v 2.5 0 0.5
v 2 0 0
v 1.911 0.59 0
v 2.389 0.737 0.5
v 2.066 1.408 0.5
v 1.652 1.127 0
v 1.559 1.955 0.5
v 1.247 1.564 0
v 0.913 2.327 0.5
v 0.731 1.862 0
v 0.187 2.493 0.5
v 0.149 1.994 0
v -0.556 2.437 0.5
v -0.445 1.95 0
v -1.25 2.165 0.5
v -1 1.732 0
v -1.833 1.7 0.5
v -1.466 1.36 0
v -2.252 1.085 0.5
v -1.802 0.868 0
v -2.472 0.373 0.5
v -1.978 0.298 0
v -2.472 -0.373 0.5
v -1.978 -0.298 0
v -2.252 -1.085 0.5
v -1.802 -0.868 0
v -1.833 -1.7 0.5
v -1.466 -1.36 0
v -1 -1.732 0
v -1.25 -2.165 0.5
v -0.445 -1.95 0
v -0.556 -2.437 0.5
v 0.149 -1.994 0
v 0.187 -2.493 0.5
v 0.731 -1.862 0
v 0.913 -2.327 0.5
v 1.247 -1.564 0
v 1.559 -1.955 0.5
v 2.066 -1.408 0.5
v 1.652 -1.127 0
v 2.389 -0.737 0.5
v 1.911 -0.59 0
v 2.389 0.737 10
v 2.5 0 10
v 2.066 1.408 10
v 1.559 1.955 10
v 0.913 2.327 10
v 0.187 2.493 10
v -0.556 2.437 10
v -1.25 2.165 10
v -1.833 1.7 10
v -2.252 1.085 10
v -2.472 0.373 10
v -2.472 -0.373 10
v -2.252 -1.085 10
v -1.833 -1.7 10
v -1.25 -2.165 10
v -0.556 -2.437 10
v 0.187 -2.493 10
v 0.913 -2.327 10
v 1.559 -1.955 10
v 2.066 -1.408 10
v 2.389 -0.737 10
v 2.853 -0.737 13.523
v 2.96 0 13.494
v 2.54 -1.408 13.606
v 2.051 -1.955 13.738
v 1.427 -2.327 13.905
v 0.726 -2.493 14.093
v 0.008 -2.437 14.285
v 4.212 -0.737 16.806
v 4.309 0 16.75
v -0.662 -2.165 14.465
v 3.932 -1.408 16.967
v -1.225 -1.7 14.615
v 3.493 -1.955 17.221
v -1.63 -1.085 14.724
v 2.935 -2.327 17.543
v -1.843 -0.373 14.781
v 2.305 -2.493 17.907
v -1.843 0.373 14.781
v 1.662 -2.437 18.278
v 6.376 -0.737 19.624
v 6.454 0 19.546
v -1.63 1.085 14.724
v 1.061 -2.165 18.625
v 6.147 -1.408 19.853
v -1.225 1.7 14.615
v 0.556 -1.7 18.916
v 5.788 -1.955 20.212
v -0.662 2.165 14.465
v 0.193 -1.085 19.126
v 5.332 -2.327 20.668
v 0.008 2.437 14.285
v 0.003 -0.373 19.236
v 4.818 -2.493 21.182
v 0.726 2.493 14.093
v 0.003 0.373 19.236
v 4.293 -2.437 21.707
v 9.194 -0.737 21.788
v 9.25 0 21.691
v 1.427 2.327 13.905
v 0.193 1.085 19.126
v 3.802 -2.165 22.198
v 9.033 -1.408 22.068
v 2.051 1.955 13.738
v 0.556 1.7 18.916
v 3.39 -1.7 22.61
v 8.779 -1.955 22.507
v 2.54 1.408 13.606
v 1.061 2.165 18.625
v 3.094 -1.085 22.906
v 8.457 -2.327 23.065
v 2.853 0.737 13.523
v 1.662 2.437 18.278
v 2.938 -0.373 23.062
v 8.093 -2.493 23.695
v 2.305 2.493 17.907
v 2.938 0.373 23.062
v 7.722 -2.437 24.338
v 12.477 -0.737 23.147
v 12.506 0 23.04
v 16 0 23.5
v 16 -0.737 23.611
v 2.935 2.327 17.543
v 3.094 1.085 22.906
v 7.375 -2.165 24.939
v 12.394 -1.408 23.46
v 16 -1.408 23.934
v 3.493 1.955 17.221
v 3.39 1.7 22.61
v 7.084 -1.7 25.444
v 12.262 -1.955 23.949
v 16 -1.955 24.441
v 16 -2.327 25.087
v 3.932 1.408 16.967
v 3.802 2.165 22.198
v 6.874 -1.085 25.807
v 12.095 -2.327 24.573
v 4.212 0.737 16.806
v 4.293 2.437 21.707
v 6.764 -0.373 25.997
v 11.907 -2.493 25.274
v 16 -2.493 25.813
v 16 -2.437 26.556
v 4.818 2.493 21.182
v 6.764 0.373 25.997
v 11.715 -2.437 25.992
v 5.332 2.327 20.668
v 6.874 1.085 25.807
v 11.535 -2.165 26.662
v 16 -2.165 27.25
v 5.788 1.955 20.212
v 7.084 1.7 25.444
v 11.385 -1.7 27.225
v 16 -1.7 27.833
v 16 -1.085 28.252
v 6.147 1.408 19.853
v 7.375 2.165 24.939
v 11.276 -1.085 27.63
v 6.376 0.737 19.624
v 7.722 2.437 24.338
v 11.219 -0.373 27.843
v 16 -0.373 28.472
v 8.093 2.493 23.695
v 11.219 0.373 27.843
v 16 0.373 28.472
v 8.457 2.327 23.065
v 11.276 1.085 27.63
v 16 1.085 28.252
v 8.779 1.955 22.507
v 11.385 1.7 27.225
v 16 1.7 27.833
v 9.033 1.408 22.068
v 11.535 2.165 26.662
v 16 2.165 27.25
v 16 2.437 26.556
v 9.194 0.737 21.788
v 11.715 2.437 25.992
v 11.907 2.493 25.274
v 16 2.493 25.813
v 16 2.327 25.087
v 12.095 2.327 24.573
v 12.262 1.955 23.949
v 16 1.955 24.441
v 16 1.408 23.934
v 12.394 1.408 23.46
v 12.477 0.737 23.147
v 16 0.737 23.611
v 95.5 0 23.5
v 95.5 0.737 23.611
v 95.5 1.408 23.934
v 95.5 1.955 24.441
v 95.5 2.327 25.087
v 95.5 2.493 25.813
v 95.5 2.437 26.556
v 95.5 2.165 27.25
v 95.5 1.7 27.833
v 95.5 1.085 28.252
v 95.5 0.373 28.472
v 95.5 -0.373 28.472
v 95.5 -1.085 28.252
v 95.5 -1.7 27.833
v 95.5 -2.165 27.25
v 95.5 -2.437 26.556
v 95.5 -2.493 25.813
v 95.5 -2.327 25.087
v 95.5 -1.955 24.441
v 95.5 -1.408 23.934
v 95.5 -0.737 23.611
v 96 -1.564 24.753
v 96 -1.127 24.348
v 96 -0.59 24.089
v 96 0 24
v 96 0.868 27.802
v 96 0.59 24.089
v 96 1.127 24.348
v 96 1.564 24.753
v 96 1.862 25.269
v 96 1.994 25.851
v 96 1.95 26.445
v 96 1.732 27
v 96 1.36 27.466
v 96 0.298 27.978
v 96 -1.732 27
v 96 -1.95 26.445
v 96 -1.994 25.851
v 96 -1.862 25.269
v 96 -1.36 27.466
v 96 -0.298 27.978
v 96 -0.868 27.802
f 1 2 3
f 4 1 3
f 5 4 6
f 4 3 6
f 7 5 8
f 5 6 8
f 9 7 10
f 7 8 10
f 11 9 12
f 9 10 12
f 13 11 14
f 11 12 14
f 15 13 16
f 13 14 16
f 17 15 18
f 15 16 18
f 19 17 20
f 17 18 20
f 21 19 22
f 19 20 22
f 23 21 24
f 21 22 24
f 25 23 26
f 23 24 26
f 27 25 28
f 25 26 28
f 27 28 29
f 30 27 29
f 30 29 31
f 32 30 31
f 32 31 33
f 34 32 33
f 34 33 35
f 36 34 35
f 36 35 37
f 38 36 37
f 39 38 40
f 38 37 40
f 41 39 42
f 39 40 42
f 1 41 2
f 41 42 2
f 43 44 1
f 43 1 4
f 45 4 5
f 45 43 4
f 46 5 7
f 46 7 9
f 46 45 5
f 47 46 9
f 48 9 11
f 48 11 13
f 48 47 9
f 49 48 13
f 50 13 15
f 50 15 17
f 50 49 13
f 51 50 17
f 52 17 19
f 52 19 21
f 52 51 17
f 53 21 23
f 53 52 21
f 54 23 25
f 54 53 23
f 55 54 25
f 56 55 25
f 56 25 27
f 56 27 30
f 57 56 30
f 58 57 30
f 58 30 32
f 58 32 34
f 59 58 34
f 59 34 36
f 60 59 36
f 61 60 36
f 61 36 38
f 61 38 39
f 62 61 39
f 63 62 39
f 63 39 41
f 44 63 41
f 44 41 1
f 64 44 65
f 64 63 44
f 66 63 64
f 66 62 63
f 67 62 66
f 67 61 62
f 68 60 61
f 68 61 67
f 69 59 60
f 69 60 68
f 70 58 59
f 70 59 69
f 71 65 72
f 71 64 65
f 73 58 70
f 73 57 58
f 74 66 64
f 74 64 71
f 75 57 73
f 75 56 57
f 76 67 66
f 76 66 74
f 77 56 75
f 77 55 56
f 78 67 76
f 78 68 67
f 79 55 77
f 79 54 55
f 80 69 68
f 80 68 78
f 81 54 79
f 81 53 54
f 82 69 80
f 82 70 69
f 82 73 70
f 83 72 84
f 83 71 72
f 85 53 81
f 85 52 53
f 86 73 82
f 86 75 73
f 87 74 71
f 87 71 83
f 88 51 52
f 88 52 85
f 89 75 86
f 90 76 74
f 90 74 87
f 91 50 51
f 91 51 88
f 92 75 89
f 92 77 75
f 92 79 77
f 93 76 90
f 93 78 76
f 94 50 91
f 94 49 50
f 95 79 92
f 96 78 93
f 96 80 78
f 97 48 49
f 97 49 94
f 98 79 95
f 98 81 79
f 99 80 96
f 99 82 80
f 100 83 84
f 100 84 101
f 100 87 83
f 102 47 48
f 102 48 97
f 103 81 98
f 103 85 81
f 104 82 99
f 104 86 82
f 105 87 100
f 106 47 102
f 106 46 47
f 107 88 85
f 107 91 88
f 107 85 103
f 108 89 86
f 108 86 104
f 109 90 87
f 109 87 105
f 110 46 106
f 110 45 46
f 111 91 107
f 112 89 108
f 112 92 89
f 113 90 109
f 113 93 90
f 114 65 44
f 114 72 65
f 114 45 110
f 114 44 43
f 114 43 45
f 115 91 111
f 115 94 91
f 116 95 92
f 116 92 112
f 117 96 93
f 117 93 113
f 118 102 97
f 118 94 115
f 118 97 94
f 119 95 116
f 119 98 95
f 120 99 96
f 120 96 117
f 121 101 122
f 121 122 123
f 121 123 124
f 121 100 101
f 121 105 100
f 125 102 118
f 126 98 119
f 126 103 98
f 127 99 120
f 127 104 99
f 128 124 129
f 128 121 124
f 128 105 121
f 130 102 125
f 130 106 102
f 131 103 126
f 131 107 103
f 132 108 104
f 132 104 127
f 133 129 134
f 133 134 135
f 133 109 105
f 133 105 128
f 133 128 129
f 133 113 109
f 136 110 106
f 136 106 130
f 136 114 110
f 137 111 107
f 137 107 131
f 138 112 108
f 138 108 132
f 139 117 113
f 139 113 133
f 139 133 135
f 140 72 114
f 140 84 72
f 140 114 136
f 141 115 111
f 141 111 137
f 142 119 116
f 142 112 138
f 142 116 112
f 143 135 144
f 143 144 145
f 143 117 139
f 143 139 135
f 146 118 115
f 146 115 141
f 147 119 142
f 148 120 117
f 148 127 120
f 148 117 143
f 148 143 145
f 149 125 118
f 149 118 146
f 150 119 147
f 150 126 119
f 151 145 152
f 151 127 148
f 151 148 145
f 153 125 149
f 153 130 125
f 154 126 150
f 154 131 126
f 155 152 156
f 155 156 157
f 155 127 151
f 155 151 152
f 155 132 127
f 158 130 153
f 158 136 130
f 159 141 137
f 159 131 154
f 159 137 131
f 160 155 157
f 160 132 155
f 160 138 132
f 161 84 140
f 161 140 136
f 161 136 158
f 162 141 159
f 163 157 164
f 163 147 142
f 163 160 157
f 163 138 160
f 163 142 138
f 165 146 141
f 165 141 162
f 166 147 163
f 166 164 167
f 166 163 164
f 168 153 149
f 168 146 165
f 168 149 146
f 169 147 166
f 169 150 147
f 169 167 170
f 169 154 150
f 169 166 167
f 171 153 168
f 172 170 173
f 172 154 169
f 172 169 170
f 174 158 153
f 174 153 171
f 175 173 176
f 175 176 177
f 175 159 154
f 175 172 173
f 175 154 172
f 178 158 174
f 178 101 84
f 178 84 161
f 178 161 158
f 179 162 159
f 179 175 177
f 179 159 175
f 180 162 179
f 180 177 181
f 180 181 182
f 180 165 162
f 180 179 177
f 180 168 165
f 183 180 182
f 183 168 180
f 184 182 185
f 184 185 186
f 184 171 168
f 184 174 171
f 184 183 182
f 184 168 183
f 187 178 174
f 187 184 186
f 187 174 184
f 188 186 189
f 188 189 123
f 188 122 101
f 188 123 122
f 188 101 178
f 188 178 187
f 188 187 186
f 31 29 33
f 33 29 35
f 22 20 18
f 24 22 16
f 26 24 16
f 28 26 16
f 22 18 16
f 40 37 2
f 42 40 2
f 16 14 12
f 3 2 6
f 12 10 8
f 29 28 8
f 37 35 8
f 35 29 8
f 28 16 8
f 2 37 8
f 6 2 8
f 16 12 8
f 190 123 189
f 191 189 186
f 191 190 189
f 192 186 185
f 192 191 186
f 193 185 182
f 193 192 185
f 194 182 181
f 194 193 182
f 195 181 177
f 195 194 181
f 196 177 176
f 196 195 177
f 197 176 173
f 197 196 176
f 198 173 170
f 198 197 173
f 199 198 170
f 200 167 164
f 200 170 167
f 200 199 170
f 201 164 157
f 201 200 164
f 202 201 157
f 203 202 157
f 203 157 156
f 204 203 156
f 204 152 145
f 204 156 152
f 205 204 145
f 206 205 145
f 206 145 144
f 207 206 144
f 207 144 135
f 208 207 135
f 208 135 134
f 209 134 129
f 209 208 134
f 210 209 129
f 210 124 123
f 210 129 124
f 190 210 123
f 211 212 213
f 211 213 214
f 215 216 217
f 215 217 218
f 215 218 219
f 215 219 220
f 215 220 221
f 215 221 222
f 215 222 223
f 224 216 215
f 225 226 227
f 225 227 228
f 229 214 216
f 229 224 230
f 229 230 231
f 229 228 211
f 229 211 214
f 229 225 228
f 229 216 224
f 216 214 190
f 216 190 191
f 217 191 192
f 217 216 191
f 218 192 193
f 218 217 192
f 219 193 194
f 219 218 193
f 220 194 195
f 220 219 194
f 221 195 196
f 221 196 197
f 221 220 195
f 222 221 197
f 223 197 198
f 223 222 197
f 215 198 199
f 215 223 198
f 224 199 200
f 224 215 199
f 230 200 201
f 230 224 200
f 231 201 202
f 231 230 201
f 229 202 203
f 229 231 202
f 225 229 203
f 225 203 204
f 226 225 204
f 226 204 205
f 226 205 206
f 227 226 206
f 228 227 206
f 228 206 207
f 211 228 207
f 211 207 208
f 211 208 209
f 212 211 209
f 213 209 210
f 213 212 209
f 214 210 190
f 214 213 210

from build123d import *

# Parameters (mm, degrees)
F1_R     = 2.5
F3_SIZE2 = 0.5
F3_SIZE  = 0.5


with BuildPart() as f2:
    # F2: sweep along a path in F0
    with BuildLine(Plane.XZ) as f2_path:
        Line((0, 0), (0, 10))
        ThreePointArc((0, 10), (4.686291501, 21.313708499), (16, 26))
        Line((16, 26), (96, 26))
    # F1 (on Top) → F2 (sweep)
    with BuildSketch(Plane.XY):
        Circle(F1_R)
    sweep(path=f2_path.line)

    # F3
    f3_edges = [f2.edges().sort_by_distance(p)[0] for p in [
        (-2.5, 0, 0),
        (96, 0, 28.5),
    ]]
    chamfer(f3_edges, length=F3_SIZE, length2=F3_SIZE2)


solid = f2.part
